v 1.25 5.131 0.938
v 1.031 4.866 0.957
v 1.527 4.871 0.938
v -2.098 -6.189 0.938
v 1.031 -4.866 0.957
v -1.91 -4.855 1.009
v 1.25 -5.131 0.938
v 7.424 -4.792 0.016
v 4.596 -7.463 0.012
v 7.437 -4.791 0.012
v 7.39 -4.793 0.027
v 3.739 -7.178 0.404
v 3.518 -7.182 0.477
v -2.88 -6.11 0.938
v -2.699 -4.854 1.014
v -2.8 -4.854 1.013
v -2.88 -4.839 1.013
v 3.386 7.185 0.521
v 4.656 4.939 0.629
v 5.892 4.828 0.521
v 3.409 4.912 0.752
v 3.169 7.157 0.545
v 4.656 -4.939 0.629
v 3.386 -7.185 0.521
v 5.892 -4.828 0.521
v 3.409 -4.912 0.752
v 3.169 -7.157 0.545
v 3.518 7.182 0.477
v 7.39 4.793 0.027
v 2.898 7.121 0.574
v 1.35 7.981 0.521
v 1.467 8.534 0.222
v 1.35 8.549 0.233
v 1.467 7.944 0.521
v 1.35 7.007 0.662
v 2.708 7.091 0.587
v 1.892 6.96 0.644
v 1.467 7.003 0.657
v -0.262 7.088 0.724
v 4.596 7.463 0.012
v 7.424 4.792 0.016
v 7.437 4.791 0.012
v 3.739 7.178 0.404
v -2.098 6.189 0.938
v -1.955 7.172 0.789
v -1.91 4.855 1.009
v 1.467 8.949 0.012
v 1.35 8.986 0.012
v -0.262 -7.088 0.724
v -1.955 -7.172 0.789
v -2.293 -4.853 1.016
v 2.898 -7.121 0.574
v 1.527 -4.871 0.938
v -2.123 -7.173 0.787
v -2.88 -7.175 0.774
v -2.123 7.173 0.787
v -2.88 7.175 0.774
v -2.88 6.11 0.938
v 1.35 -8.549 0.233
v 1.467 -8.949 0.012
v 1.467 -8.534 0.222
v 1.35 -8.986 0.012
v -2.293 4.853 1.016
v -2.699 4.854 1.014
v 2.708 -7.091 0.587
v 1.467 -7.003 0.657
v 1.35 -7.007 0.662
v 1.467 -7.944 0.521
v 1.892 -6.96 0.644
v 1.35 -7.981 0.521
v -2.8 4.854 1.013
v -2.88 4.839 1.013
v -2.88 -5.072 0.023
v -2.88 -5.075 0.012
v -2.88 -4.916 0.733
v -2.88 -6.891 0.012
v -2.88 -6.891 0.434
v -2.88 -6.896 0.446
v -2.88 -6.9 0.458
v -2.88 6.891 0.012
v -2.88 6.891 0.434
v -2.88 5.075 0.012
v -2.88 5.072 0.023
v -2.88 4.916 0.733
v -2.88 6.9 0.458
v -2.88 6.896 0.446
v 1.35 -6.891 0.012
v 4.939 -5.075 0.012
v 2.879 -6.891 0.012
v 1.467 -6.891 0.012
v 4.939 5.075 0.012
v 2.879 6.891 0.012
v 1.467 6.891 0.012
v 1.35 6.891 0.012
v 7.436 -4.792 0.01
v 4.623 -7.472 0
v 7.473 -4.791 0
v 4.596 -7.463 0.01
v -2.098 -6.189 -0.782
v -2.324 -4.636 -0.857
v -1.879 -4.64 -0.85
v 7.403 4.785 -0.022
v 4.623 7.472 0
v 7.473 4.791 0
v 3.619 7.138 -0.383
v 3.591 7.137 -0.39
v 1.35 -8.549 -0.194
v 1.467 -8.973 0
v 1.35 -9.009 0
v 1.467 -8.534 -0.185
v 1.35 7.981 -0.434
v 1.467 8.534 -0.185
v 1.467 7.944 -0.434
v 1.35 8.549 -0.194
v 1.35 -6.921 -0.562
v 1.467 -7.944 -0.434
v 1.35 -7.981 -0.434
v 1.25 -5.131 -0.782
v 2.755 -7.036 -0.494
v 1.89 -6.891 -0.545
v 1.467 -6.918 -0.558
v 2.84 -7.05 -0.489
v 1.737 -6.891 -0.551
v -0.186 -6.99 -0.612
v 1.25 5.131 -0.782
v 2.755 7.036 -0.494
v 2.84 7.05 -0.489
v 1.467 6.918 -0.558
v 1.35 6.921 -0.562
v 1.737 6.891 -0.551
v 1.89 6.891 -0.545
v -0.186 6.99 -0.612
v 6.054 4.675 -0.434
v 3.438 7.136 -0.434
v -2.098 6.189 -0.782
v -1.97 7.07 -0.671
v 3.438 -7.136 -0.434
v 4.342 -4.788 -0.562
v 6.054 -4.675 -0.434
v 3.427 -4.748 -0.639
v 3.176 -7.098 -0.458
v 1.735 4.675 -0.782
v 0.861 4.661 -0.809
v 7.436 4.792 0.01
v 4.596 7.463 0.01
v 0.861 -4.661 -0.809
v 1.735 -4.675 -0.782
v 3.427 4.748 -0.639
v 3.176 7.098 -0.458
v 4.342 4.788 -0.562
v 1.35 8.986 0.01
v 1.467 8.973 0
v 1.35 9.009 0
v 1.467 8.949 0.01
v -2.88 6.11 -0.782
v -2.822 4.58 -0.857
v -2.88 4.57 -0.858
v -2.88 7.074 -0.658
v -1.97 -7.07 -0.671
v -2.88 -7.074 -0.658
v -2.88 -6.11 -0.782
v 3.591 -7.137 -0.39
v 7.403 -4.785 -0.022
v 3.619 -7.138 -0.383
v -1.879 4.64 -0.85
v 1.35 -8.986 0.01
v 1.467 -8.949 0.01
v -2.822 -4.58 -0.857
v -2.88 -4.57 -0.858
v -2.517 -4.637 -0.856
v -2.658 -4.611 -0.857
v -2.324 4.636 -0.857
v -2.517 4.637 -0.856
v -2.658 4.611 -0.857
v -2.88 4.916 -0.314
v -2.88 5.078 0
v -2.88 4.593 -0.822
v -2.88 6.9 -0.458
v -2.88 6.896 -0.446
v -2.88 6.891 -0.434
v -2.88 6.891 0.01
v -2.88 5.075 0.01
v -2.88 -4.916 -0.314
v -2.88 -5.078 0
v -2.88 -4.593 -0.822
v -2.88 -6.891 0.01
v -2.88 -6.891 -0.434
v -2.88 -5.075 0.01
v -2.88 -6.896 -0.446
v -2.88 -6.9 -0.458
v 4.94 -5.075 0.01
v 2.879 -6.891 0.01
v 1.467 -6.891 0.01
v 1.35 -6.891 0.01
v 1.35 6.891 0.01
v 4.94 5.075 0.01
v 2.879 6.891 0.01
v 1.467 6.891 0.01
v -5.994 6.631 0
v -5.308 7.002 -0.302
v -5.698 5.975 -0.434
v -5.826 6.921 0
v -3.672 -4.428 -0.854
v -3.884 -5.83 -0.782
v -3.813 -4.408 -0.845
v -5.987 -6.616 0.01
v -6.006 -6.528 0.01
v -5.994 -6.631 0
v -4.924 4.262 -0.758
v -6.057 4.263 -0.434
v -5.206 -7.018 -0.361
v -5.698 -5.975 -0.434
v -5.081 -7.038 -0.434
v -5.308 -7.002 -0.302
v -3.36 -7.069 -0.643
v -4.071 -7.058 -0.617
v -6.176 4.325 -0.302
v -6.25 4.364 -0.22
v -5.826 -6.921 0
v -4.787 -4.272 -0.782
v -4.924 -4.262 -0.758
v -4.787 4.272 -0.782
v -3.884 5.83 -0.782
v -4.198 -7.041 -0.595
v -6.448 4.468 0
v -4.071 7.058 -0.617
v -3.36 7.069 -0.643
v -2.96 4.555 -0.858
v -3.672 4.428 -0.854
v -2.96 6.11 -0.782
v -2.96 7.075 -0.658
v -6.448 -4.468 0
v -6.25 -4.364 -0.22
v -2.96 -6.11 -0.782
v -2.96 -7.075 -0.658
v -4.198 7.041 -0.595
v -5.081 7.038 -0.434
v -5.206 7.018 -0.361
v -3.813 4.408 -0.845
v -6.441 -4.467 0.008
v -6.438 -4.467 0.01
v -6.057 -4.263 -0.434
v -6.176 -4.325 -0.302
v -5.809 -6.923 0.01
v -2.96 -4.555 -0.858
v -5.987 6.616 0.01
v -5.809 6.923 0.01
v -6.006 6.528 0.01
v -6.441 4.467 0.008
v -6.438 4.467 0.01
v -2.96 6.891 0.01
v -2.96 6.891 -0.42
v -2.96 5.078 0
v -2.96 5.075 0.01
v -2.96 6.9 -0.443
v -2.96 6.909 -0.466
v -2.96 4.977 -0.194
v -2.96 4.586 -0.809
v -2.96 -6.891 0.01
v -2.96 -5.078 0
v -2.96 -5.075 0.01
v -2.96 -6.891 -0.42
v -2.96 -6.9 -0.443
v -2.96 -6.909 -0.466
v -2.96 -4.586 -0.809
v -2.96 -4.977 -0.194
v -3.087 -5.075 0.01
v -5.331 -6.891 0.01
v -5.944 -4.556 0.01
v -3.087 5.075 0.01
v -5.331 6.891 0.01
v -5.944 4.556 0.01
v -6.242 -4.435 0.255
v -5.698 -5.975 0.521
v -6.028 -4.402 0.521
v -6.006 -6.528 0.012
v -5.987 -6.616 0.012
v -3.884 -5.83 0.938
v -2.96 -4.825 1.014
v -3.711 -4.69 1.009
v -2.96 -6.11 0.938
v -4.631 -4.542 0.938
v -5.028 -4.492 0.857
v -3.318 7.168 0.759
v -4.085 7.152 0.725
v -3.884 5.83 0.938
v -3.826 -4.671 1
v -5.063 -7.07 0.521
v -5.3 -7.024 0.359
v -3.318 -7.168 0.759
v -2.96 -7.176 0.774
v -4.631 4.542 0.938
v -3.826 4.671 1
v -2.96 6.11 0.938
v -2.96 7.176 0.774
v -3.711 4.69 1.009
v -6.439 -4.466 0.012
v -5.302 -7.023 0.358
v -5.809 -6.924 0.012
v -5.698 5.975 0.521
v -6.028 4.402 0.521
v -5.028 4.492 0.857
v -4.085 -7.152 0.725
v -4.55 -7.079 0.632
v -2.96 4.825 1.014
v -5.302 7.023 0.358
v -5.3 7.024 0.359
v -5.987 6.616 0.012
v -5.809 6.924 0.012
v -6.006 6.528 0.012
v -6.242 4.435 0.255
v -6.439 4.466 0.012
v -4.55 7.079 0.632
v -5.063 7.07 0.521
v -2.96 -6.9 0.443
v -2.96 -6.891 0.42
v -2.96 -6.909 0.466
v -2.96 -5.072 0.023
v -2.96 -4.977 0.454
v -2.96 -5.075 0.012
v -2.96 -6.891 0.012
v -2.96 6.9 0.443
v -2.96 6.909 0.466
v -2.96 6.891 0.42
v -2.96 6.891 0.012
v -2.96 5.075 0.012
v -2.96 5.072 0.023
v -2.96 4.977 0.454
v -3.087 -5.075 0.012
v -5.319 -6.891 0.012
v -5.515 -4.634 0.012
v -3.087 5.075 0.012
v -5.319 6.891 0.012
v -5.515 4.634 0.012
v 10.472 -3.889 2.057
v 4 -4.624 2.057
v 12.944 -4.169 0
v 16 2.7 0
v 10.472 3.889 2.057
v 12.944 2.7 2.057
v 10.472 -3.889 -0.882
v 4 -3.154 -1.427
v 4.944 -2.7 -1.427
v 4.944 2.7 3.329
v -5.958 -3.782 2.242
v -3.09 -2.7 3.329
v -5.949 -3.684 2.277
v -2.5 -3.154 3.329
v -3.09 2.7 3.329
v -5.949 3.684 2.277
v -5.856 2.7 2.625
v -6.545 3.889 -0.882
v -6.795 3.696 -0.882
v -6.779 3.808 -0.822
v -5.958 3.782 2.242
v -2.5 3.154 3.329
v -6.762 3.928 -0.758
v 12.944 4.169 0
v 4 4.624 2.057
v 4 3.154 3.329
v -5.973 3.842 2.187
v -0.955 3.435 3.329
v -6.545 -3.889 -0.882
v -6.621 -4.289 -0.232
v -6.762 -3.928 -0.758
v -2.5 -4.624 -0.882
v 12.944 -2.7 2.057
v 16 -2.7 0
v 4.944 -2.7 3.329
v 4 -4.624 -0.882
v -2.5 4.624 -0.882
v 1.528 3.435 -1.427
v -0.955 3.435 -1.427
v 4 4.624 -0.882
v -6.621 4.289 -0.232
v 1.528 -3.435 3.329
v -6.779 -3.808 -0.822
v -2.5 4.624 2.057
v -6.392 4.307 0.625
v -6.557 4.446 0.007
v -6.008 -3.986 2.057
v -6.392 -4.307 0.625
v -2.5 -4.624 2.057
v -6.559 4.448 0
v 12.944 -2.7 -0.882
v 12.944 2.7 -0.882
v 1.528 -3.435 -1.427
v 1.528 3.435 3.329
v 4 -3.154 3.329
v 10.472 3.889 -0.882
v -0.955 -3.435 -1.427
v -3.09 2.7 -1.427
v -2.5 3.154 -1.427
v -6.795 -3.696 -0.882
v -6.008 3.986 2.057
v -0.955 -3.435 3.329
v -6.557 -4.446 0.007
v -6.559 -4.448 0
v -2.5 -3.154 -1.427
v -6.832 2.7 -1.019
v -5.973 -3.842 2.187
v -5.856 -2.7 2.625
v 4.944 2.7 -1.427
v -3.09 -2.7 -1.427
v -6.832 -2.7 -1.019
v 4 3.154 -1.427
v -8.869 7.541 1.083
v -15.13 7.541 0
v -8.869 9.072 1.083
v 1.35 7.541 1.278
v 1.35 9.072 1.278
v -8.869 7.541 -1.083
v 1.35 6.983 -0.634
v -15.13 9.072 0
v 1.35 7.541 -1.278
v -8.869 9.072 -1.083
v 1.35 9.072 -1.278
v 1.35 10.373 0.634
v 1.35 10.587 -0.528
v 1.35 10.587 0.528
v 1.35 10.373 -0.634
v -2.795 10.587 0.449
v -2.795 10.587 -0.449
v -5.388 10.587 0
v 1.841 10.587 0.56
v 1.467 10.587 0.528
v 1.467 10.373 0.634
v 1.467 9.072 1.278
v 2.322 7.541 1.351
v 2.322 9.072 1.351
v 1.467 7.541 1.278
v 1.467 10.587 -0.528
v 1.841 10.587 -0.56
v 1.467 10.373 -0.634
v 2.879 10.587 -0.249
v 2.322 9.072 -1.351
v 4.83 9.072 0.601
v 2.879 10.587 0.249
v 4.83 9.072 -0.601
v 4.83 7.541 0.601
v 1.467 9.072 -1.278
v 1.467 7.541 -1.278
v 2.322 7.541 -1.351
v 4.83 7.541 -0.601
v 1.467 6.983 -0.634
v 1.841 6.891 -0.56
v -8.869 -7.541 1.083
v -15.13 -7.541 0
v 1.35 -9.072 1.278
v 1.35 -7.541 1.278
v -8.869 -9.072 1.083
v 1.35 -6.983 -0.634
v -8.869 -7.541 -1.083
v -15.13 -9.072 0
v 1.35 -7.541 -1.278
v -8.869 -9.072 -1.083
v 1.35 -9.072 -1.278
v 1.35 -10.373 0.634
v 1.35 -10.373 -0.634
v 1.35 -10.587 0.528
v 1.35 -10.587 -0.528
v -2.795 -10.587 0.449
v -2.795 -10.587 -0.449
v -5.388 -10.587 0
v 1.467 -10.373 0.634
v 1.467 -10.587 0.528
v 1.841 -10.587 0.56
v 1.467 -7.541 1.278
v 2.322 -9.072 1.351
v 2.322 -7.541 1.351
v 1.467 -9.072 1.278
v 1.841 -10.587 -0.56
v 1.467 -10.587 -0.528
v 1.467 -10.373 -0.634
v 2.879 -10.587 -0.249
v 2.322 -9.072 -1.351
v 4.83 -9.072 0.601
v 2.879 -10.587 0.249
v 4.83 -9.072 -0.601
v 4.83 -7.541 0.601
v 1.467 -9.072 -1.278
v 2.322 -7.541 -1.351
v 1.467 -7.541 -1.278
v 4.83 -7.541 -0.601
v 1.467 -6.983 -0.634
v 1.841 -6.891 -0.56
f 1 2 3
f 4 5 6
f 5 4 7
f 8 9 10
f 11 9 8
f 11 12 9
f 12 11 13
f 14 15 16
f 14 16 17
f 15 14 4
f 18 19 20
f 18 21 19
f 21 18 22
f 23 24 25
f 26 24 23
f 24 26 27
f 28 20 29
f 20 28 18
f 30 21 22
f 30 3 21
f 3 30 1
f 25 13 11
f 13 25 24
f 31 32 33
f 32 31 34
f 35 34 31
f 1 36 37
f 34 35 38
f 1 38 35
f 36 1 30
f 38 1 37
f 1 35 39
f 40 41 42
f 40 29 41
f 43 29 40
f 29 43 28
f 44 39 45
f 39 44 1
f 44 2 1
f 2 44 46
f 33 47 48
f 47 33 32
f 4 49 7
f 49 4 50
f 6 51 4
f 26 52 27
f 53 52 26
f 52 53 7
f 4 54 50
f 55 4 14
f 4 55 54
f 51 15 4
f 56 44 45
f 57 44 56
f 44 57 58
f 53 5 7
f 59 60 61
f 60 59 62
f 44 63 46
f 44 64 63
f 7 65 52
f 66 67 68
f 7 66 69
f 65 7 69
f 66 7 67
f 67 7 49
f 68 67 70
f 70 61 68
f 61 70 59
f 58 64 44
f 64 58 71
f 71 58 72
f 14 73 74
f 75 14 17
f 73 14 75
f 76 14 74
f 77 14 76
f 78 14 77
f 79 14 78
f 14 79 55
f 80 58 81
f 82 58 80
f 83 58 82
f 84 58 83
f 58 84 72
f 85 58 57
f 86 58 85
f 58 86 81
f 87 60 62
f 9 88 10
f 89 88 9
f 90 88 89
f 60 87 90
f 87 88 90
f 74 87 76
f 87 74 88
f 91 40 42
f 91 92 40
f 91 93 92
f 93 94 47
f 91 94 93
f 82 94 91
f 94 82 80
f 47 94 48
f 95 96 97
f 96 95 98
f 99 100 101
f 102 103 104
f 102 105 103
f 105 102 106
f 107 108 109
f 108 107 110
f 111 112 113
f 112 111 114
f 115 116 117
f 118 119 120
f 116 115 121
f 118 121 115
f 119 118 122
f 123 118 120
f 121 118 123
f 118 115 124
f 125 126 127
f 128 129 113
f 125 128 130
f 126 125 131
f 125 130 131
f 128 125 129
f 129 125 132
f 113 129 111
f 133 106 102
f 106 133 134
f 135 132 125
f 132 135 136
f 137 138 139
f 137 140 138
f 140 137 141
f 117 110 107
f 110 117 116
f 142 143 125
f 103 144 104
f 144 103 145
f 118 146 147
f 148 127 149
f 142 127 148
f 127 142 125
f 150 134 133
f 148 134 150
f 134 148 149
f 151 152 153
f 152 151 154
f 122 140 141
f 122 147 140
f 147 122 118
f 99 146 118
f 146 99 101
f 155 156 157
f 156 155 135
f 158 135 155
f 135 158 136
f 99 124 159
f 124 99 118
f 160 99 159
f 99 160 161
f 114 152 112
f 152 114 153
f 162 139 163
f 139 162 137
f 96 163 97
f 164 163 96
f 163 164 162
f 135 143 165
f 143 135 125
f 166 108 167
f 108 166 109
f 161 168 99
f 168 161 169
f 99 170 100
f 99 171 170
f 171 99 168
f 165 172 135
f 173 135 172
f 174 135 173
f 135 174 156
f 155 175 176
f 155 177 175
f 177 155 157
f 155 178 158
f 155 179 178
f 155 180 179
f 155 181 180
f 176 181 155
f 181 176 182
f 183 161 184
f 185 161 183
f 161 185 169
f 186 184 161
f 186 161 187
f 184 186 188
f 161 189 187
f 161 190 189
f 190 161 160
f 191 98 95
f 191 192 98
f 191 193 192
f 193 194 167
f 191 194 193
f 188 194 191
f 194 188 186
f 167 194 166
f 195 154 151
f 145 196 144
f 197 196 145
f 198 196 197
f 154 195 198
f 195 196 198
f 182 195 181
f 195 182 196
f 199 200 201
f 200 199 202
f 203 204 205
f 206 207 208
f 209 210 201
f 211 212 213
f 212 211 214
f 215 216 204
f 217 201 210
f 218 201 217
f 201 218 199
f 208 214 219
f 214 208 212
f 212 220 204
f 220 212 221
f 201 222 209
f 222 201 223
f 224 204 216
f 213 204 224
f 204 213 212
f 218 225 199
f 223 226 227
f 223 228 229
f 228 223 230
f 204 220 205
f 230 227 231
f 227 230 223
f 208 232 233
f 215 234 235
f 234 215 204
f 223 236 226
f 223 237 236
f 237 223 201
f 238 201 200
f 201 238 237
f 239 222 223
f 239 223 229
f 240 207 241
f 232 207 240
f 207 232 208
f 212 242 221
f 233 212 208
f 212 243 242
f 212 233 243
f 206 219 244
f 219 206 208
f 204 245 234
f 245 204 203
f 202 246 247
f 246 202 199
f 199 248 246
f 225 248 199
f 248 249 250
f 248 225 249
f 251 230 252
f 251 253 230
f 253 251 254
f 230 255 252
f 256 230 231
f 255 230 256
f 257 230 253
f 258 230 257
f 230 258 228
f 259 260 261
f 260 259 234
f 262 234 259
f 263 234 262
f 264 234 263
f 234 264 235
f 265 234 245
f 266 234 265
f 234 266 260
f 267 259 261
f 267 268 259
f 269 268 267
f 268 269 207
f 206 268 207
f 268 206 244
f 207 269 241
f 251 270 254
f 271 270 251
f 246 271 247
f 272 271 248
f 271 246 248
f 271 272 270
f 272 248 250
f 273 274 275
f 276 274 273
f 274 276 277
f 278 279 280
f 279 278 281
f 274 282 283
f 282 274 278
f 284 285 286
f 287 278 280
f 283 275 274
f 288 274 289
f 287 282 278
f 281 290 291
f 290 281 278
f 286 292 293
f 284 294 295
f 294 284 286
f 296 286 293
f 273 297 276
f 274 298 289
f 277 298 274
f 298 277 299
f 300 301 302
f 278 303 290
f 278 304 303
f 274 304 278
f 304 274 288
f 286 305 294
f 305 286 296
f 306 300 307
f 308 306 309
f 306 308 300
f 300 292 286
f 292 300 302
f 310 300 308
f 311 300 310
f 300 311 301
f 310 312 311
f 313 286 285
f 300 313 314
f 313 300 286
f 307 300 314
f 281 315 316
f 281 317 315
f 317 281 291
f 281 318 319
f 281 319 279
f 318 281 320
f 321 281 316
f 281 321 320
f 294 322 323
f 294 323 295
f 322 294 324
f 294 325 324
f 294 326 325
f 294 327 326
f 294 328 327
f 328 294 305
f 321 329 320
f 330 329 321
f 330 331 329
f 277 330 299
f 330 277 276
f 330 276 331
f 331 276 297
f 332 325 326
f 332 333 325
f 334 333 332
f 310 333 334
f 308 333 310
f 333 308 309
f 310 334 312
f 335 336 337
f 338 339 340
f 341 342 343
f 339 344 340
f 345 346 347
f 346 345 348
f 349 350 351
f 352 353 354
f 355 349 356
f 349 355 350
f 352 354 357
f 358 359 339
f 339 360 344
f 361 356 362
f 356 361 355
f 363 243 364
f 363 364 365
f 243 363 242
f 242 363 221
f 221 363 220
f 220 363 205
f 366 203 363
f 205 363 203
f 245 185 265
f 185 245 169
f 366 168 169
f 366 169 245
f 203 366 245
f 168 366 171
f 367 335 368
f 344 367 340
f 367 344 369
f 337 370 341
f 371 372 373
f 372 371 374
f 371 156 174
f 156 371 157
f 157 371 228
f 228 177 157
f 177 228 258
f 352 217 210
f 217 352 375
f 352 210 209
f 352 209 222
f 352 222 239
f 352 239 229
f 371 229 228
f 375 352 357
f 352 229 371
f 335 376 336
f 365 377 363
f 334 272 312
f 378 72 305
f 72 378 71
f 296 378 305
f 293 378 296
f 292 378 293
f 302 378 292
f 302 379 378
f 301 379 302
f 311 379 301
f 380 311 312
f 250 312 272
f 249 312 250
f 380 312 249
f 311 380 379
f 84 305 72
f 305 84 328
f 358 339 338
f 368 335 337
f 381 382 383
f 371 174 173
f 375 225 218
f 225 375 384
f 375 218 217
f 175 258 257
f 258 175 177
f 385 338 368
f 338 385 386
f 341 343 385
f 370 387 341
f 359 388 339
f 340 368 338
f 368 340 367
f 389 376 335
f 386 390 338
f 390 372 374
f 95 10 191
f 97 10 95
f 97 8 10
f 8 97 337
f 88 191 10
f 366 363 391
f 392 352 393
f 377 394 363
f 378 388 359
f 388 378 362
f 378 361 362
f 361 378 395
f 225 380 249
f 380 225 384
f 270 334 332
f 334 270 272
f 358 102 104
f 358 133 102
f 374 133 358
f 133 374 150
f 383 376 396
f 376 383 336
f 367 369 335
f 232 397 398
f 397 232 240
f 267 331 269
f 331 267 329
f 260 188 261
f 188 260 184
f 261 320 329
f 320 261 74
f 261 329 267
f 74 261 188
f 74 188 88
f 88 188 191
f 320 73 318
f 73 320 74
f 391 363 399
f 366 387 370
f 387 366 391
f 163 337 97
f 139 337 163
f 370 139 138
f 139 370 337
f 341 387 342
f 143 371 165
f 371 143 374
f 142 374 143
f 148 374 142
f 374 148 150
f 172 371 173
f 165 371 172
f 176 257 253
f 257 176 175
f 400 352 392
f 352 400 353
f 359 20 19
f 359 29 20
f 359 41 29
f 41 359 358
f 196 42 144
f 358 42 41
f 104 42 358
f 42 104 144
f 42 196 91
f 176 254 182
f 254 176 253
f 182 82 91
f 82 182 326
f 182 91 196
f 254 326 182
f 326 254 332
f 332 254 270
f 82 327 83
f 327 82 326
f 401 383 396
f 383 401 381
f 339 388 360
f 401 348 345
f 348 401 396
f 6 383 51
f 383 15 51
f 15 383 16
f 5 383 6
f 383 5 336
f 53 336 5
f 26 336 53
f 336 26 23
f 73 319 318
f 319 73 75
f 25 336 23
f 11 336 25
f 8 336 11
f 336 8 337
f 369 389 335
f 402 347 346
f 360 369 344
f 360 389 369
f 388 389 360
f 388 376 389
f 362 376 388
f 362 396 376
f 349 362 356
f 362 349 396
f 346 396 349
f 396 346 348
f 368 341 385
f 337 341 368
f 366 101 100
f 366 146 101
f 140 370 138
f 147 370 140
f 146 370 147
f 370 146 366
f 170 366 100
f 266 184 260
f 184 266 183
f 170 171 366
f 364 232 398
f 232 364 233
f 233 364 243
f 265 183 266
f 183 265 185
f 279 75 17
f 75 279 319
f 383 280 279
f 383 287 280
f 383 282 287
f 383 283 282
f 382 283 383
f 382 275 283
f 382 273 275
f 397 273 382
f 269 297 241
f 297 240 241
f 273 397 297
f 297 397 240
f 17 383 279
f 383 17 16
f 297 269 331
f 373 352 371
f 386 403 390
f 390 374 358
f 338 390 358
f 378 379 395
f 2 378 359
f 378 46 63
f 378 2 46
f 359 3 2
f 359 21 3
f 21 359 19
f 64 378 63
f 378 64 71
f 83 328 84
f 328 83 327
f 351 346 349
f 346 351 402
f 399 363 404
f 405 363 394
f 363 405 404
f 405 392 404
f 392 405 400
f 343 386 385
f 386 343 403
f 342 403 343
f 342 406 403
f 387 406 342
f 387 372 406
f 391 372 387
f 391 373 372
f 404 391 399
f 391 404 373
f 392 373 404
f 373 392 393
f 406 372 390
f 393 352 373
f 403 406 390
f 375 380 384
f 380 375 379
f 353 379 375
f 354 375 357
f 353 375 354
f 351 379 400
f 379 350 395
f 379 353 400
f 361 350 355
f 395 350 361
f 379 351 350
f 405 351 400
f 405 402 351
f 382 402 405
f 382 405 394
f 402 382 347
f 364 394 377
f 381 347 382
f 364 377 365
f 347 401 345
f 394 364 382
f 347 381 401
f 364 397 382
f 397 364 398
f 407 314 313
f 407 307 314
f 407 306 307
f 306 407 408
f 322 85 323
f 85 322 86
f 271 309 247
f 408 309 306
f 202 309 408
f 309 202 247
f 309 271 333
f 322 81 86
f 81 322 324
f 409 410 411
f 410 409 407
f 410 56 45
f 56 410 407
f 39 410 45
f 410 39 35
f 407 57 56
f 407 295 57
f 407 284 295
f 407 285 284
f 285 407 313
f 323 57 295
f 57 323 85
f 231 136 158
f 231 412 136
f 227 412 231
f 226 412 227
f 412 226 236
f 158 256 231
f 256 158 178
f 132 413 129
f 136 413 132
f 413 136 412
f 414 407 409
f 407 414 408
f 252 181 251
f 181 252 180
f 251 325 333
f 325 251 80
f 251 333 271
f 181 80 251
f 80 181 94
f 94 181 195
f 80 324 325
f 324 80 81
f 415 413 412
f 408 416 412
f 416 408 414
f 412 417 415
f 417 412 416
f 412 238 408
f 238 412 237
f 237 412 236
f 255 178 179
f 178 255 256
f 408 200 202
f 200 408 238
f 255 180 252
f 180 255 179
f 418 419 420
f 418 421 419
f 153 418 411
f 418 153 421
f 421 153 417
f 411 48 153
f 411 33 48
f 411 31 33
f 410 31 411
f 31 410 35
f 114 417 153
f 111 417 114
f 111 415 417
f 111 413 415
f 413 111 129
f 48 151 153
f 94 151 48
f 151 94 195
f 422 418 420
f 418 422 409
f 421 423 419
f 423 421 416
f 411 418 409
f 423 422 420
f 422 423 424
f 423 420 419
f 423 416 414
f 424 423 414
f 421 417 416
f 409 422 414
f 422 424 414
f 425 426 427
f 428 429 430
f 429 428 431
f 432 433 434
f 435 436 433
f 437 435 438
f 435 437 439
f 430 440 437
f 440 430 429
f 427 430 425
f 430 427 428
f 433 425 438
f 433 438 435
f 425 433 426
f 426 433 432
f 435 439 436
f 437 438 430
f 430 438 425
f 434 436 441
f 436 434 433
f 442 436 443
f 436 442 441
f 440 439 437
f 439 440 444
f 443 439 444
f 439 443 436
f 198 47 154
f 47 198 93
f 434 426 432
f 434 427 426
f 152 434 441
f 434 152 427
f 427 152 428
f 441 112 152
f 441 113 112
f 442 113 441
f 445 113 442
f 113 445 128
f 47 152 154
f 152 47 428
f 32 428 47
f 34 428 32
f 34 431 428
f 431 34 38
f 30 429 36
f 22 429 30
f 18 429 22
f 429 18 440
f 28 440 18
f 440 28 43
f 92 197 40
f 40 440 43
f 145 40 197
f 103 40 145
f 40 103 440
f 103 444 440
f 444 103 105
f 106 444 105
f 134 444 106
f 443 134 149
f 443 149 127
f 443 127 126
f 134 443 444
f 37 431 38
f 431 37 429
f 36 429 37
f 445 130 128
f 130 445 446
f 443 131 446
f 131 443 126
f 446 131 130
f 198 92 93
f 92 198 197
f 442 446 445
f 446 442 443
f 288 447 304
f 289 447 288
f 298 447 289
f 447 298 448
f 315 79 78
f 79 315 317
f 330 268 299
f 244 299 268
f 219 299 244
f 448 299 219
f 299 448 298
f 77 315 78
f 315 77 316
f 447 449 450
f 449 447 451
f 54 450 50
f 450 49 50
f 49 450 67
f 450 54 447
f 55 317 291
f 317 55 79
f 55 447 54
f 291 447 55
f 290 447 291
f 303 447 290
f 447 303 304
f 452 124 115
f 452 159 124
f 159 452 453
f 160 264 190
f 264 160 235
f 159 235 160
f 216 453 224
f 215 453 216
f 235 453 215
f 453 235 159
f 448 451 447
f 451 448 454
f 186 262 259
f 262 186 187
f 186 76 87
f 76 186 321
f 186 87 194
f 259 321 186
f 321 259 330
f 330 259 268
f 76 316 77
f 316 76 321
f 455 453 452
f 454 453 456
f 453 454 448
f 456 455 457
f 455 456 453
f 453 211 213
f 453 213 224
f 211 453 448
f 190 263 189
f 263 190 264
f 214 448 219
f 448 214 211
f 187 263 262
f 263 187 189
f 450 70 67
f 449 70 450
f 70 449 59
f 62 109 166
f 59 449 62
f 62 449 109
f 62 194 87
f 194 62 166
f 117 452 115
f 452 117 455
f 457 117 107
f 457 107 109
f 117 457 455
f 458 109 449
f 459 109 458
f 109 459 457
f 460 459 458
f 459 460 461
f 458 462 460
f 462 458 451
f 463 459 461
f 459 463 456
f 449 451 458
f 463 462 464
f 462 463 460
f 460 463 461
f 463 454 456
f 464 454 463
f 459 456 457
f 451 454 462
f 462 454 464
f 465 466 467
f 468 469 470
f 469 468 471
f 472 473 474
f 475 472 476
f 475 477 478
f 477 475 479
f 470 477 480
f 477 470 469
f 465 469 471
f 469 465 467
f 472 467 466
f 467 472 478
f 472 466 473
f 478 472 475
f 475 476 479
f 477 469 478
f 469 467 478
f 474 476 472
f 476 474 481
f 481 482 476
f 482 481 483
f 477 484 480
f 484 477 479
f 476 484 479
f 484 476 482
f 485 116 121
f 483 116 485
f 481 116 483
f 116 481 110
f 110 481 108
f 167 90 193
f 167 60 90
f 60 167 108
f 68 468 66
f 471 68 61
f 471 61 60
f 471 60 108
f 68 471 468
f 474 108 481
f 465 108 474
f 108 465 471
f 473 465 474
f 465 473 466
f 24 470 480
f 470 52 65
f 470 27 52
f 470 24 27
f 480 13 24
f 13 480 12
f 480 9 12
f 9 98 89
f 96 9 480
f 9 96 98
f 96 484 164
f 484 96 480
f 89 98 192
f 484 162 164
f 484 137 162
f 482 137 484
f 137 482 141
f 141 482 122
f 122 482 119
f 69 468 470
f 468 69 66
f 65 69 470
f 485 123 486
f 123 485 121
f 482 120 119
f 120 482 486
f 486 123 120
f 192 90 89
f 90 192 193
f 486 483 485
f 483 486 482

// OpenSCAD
// file: ../lib/util.scad
fn1 = 32;
fn2 = 16;

module util_half_sphere(radius, fn=fn1) {
    difference() {
        sphere(radius, $fn=fn);
        translate([0,0,-(radius+radius/19)])
            cube(2*radius+radius/10, center=true);
    }
}

function gcd(a,b) = a == b ? a : a > b ? gcd(a-b, b) : gcd(a, b-a);

module util_saucer(length, width, height, fn=fn1) {
    rad = gcd(length,gcd(width,height));
    //rad = 10;
    scale([length/(2*rad), width/(2*rad), height/rad])
        util_half_sphere(rad, fn);
}

module util_half_cylinder(length, radius, inner_fn=fn2, outer_fn=fn1) {
    maxval = max(length, 2*radius);
    intersection() {
        difference() {
            rotate([0,90,0])
                translate([0,0,-(length/2 + length/20)])
                    cylinder(length+length/10, radius, radius, $fn=inner_fn);
            
            translate([0,0,(maxval/2 + maxval/19)])
                cube(maxval+maxval/10, center=true);
        }
        
        translate([0,0,-(radius+radius/20)])
            cylinder(radius + radius/10, length/2, length/2, $fn=outer_fn);
    }
}

module util_body(length, width, height, upper_height, fn=fn1) {
    rad = gcd(length, gcd(width, upper_height));
    
    scale(.995) scale([length/(2*rad), width/(2*rad), 1])
        util_half_cylinder(2*rad, height, outer_fn=fn);
}

module util_graded_cylinder(height, radius_start, radius_end, grades=1, fn=fn1) {
    height_grade = height / grades;
    radius_grade = (radius_start - radius_end) / (grades * grades);
    for (i = [0 : 1 : grades]) {
        translate([0,0,i*height_grade])
            cylinder(height_grade, 
                     radius_start - i*radius_grade * i,
                     radius_start - (i+1) * radius_grade * (i+1),
                     $fn = fn);
    }
}

module util_nacelle(length, width, height, curved=false, up=true, front_bulge=false) {
    rad = min(width, height/2);
    grads = curved ? 6 : 1;
    scale_factor = front_bulge ? 1.1 : 1;
    direction = up ? -1 : 1;
    difference() {
        scale([1, width/ (2*rad), height/rad])
            difference() {
                union() {
                    rotate([0,-90,0])
                        rotate(30)
                            util_graded_cylinder(length-rad, rad, rad/2, grads, 6);
                    scale(scale_factor) 
                        rotate([0,90,0]) rotate(90) sphere(rad, $fn=6);
                }
                
                translate([-length/2, 0, direction * (height/2 + height/19)])
                    cube([length+length, width+width, height+height/10], center=true);
            }
        
        translate([-length-(curved?length/3:0), 0, -length/3])
            rotate([0,-45,0])
                cube(length, center=true);
    }
}

module util_mirrored(v) {
    children();
    mirror(v) children();
}

module util_ring(outer, inner, height) {
    difference() {
        translate([0,0,-height/2])
            cylinder(height, outer, outer);
        translate([0,0,-(height/2 + height/19)])
            cylinder(height+height/10, inner, inner);
    }
}

module util_star(radius, thick, num, half=false) {
    angle = 360/num;
    offset = half? angle/2 : 0;
    for (i = [0: 1: num]) {
        rotate(i* angle + offset)
            translate([radius/2,0,0])
                cube([radius, thick, thick], center=true);
    }
}

module util_ring_star(radius, thick, num, inner, half=false) {
    outer=inner+thick;
    avg = (inner + outer)/2;
    union() {
        difference() {
            util_star(radius, thick, num, half);
            cylinder(2*thick, outer, outer, $fn=num, center=true);
        }
        util_ring(outer, inner, thick);
    }
}

module util_hangar_disk(height, lower, upper, num, fn=fn1) {
    difference() {
            cylinder(height, lower, upper, $fn=fn, center=true);
        difference() {
            scale([1,1,22])
                util_star(1.1*upper, height/20, num, half=true);
            scale(.95)
                cylinder(height, lower, upper, $fn=fn, center=true);
        }
    }
}

module util_hangar_form(length, width, height, num, inner=0) {
    l = 0.6* max(length, width);
    h = 2.5* height;
    thick = min(height/20,1);
    inner = inner == 0 ? l/3 : inner;
    difference() {
        children();
        scale([1,1,h/thick]) 
            util_ring_star(l, thick, num, inner, half=true);
    }
    scale(.95) children();
}

module util_nacelle_bar(span, height, width, thickness) {
    rad = (span*span/(8*height) + height/2);
    outer = rad + thickness/2;
    inner = rad - thickness/2;
    difference(){
        translate([0,0,outer])
            rotate([0,90,0])
                util_ring(outer, inner, width);
    
        translate([0,0,1.1*outer+height])
            cube(2.2*outer, center=true);
    }
}

module util_q_sphere(rad, quadrant, faces) {
    x_sign = quadrant == 1 ? 1 :
             quadrant == 2 ? -1 :
             quadrant == 3 ? -1 :
             quadrant == 4 ? 1 : 0;
    z_sign = quadrant == 1 ? 1 :
             quadrant == 2 ? 1 :
             quadrant == 3 ? -1 :
             quadrant == 4 ? -1 : 0;
    
    difference() {
        sphere(rad, $fn=faces);

        translate([x_sign*-1.1*rad + .01,0,0])
        cube(2.2*rad, center=true);

        translate([0,0,z_sign*-1.1*rad + .01])
        cube(2.2*rad, center=true);
    }
}

module util_ovoid(front_rad, back_rad, width, upper_rad, lower_rad, faces=32) {
    half_width = width/2;
    largest=max(front_rad, back_rad, half_width, upper_rad, lower_rad);
    smallest=min(front_rad, back_rad, half_width, upper_rad, lower_rad);
    
    union() {
        scale([front_rad/smallest, half_width/smallest, upper_rad/smallest])
        util_q_sphere(smallest, 1, faces);
        
        scale([front_rad/smallest, half_width/smallest, lower_rad/smallest])
        util_q_sphere(smallest, 4, faces);
        
        scale([back_rad/smallest, half_width/smallest, lower_rad/smallest])
        util_q_sphere(smallest, 3, faces);
        
        scale([back_rad/smallest, half_width/smallest, upper_rad/smallest])
        util_q_sphere(smallest, 2, faces);
    }
}
// main file
use <../lib/util.scad>;

module tactical() {
    difference() {
        union() {
            hull()
            util_mirrored([0,1,0])
            translate([0,2.7,0])
            util_ovoid(16,10,5,3.5,1.5, faces=10);
            
            translate([-3,0,0])
            util_ovoid(12,4,20,1.2,1,faces=13);
        }

        translate([-25/2-7,0,0])
        rotate([0,15,0])
        cube(25,center=true);
    }
    
    util_mirrored([0,1,0])
    translate([1.5,8,0])
    rotate([90,0,0])
    mirror([1,0,0])
    util_ovoid(18,4,3,1.2,2.8,faces=7);
    
}




tactical();
